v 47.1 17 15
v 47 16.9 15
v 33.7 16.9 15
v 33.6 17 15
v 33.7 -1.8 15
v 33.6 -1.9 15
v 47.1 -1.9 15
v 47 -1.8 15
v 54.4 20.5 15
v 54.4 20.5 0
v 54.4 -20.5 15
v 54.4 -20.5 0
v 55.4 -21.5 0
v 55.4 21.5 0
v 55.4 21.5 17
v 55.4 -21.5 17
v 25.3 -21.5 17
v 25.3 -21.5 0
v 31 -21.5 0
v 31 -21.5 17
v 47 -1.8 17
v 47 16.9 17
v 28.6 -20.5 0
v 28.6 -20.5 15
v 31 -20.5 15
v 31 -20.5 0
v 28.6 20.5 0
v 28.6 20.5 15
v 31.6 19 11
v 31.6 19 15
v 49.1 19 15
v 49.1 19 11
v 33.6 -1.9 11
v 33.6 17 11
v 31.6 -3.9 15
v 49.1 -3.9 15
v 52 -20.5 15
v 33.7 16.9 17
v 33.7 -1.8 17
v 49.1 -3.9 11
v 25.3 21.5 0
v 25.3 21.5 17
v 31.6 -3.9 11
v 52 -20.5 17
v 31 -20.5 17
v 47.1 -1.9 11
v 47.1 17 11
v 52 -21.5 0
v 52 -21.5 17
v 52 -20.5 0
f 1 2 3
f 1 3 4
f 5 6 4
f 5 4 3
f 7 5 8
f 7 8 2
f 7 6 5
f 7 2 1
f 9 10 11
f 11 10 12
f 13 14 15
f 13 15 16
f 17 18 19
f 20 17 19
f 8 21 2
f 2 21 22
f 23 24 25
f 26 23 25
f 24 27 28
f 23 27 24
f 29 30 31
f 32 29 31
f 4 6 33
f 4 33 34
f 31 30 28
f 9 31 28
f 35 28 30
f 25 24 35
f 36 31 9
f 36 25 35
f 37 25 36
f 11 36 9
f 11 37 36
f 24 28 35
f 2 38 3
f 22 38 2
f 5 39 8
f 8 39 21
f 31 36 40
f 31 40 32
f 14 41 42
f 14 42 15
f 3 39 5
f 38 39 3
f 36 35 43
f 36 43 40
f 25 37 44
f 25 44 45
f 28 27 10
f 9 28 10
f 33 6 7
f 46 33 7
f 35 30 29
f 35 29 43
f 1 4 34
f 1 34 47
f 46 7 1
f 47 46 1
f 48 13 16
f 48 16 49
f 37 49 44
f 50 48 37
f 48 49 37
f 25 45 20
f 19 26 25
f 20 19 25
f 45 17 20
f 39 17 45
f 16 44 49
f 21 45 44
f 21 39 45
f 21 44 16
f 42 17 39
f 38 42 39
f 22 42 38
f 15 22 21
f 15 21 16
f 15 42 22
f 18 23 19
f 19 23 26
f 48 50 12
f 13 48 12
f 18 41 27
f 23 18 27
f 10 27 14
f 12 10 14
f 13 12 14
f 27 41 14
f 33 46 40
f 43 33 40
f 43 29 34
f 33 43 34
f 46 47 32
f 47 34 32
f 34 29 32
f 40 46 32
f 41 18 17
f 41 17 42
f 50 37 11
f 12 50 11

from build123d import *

# Parameters (mm, degrees)
PAD001_DEPTH    = 17
SKETCH008_W     = 25.8
SKETCH008_H     = 41
POCKET005_DEPTH = 15
SKETCH009_W     = 13.3
SKETCH009_H     = 18.7
POCKET006_DEPTH = 5
SKETCH010_W     = 2.3
SKETCH010_H     = 43
PAD002_DEPTH    = 17
SKETCH011_W     = 2
SKETCH011_H     = 18.9
SKETCH011_W_2   = 17.5
SKETCH011_H_2   = 2
PAD003_DEPTH    = 6


with BuildPart() as part:
    # Sketch007 → Pad001 (new body)
    with BuildSketch(Plane.XY):
        Polygon((17.6, 21.5), (45.4, 21.5), (45.4, -21.5), (42, -21.5), (42, -20.5), (21, -20.5), (21, -21.5), (17.6, -21.5), align=None)
    extrude(amount=PAD001_DEPTH)

    # Sketch008 (on Face9 of Pad001) → Pocket005 (cut)
    with BuildSketch(Plane(origin=(0, 0, 0), x_dir=(1, 0, 0), z_dir=(0, 0, -1))):
        with Locations((31.5, 0)):
            Rectangle(SKETCH008_W, SKETCH008_H)
    extrude(amount=-POCKET005_DEPTH, mode=Mode.SUBTRACT)

    # Sketch009 (on Face5 of Pocket005) → Pocket006 (cut)
    with BuildSketch(Plane.XY.offset(17)):
        with Locations((30.35, 7.55)):
            Rectangle(SKETCH009_W, SKETCH009_H)
    extrude(amount=-POCKET006_DEPTH, mode=Mode.SUBTRACT)

    # Sketch010 → Pad002 (join)
    with BuildSketch(Plane.XY):
        with Locations((16.45, 0)):
            Rectangle(SKETCH010_W, SKETCH010_H)
    extrude(amount=PAD002_DEPTH)

    # Sketch011 (on Face5 of Pad002) → Pad003 (join)
    with BuildSketch(Plane.XY.offset(17)):
        with Locations((38.1, 7.55)):
            Rectangle(SKETCH011_W, SKETCH011_H)
        with Locations((22.6, 7.55)):
            Rectangle(SKETCH011_W, SKETCH011_H)
        with Locations((30.35, 18)):
            Rectangle(SKETCH011_W_2, SKETCH011_H_2)
        with Locations((30.35, -2.9)):
            Rectangle(SKETCH011_W_2, SKETCH011_H_2)
    extrude(amount=-PAD003_DEPTH)


with BuildPart() as part_1:
    # Body001 placement: moved
    add(part.part.moved(Location((10, 0, 0))))


solid = part_1.part
